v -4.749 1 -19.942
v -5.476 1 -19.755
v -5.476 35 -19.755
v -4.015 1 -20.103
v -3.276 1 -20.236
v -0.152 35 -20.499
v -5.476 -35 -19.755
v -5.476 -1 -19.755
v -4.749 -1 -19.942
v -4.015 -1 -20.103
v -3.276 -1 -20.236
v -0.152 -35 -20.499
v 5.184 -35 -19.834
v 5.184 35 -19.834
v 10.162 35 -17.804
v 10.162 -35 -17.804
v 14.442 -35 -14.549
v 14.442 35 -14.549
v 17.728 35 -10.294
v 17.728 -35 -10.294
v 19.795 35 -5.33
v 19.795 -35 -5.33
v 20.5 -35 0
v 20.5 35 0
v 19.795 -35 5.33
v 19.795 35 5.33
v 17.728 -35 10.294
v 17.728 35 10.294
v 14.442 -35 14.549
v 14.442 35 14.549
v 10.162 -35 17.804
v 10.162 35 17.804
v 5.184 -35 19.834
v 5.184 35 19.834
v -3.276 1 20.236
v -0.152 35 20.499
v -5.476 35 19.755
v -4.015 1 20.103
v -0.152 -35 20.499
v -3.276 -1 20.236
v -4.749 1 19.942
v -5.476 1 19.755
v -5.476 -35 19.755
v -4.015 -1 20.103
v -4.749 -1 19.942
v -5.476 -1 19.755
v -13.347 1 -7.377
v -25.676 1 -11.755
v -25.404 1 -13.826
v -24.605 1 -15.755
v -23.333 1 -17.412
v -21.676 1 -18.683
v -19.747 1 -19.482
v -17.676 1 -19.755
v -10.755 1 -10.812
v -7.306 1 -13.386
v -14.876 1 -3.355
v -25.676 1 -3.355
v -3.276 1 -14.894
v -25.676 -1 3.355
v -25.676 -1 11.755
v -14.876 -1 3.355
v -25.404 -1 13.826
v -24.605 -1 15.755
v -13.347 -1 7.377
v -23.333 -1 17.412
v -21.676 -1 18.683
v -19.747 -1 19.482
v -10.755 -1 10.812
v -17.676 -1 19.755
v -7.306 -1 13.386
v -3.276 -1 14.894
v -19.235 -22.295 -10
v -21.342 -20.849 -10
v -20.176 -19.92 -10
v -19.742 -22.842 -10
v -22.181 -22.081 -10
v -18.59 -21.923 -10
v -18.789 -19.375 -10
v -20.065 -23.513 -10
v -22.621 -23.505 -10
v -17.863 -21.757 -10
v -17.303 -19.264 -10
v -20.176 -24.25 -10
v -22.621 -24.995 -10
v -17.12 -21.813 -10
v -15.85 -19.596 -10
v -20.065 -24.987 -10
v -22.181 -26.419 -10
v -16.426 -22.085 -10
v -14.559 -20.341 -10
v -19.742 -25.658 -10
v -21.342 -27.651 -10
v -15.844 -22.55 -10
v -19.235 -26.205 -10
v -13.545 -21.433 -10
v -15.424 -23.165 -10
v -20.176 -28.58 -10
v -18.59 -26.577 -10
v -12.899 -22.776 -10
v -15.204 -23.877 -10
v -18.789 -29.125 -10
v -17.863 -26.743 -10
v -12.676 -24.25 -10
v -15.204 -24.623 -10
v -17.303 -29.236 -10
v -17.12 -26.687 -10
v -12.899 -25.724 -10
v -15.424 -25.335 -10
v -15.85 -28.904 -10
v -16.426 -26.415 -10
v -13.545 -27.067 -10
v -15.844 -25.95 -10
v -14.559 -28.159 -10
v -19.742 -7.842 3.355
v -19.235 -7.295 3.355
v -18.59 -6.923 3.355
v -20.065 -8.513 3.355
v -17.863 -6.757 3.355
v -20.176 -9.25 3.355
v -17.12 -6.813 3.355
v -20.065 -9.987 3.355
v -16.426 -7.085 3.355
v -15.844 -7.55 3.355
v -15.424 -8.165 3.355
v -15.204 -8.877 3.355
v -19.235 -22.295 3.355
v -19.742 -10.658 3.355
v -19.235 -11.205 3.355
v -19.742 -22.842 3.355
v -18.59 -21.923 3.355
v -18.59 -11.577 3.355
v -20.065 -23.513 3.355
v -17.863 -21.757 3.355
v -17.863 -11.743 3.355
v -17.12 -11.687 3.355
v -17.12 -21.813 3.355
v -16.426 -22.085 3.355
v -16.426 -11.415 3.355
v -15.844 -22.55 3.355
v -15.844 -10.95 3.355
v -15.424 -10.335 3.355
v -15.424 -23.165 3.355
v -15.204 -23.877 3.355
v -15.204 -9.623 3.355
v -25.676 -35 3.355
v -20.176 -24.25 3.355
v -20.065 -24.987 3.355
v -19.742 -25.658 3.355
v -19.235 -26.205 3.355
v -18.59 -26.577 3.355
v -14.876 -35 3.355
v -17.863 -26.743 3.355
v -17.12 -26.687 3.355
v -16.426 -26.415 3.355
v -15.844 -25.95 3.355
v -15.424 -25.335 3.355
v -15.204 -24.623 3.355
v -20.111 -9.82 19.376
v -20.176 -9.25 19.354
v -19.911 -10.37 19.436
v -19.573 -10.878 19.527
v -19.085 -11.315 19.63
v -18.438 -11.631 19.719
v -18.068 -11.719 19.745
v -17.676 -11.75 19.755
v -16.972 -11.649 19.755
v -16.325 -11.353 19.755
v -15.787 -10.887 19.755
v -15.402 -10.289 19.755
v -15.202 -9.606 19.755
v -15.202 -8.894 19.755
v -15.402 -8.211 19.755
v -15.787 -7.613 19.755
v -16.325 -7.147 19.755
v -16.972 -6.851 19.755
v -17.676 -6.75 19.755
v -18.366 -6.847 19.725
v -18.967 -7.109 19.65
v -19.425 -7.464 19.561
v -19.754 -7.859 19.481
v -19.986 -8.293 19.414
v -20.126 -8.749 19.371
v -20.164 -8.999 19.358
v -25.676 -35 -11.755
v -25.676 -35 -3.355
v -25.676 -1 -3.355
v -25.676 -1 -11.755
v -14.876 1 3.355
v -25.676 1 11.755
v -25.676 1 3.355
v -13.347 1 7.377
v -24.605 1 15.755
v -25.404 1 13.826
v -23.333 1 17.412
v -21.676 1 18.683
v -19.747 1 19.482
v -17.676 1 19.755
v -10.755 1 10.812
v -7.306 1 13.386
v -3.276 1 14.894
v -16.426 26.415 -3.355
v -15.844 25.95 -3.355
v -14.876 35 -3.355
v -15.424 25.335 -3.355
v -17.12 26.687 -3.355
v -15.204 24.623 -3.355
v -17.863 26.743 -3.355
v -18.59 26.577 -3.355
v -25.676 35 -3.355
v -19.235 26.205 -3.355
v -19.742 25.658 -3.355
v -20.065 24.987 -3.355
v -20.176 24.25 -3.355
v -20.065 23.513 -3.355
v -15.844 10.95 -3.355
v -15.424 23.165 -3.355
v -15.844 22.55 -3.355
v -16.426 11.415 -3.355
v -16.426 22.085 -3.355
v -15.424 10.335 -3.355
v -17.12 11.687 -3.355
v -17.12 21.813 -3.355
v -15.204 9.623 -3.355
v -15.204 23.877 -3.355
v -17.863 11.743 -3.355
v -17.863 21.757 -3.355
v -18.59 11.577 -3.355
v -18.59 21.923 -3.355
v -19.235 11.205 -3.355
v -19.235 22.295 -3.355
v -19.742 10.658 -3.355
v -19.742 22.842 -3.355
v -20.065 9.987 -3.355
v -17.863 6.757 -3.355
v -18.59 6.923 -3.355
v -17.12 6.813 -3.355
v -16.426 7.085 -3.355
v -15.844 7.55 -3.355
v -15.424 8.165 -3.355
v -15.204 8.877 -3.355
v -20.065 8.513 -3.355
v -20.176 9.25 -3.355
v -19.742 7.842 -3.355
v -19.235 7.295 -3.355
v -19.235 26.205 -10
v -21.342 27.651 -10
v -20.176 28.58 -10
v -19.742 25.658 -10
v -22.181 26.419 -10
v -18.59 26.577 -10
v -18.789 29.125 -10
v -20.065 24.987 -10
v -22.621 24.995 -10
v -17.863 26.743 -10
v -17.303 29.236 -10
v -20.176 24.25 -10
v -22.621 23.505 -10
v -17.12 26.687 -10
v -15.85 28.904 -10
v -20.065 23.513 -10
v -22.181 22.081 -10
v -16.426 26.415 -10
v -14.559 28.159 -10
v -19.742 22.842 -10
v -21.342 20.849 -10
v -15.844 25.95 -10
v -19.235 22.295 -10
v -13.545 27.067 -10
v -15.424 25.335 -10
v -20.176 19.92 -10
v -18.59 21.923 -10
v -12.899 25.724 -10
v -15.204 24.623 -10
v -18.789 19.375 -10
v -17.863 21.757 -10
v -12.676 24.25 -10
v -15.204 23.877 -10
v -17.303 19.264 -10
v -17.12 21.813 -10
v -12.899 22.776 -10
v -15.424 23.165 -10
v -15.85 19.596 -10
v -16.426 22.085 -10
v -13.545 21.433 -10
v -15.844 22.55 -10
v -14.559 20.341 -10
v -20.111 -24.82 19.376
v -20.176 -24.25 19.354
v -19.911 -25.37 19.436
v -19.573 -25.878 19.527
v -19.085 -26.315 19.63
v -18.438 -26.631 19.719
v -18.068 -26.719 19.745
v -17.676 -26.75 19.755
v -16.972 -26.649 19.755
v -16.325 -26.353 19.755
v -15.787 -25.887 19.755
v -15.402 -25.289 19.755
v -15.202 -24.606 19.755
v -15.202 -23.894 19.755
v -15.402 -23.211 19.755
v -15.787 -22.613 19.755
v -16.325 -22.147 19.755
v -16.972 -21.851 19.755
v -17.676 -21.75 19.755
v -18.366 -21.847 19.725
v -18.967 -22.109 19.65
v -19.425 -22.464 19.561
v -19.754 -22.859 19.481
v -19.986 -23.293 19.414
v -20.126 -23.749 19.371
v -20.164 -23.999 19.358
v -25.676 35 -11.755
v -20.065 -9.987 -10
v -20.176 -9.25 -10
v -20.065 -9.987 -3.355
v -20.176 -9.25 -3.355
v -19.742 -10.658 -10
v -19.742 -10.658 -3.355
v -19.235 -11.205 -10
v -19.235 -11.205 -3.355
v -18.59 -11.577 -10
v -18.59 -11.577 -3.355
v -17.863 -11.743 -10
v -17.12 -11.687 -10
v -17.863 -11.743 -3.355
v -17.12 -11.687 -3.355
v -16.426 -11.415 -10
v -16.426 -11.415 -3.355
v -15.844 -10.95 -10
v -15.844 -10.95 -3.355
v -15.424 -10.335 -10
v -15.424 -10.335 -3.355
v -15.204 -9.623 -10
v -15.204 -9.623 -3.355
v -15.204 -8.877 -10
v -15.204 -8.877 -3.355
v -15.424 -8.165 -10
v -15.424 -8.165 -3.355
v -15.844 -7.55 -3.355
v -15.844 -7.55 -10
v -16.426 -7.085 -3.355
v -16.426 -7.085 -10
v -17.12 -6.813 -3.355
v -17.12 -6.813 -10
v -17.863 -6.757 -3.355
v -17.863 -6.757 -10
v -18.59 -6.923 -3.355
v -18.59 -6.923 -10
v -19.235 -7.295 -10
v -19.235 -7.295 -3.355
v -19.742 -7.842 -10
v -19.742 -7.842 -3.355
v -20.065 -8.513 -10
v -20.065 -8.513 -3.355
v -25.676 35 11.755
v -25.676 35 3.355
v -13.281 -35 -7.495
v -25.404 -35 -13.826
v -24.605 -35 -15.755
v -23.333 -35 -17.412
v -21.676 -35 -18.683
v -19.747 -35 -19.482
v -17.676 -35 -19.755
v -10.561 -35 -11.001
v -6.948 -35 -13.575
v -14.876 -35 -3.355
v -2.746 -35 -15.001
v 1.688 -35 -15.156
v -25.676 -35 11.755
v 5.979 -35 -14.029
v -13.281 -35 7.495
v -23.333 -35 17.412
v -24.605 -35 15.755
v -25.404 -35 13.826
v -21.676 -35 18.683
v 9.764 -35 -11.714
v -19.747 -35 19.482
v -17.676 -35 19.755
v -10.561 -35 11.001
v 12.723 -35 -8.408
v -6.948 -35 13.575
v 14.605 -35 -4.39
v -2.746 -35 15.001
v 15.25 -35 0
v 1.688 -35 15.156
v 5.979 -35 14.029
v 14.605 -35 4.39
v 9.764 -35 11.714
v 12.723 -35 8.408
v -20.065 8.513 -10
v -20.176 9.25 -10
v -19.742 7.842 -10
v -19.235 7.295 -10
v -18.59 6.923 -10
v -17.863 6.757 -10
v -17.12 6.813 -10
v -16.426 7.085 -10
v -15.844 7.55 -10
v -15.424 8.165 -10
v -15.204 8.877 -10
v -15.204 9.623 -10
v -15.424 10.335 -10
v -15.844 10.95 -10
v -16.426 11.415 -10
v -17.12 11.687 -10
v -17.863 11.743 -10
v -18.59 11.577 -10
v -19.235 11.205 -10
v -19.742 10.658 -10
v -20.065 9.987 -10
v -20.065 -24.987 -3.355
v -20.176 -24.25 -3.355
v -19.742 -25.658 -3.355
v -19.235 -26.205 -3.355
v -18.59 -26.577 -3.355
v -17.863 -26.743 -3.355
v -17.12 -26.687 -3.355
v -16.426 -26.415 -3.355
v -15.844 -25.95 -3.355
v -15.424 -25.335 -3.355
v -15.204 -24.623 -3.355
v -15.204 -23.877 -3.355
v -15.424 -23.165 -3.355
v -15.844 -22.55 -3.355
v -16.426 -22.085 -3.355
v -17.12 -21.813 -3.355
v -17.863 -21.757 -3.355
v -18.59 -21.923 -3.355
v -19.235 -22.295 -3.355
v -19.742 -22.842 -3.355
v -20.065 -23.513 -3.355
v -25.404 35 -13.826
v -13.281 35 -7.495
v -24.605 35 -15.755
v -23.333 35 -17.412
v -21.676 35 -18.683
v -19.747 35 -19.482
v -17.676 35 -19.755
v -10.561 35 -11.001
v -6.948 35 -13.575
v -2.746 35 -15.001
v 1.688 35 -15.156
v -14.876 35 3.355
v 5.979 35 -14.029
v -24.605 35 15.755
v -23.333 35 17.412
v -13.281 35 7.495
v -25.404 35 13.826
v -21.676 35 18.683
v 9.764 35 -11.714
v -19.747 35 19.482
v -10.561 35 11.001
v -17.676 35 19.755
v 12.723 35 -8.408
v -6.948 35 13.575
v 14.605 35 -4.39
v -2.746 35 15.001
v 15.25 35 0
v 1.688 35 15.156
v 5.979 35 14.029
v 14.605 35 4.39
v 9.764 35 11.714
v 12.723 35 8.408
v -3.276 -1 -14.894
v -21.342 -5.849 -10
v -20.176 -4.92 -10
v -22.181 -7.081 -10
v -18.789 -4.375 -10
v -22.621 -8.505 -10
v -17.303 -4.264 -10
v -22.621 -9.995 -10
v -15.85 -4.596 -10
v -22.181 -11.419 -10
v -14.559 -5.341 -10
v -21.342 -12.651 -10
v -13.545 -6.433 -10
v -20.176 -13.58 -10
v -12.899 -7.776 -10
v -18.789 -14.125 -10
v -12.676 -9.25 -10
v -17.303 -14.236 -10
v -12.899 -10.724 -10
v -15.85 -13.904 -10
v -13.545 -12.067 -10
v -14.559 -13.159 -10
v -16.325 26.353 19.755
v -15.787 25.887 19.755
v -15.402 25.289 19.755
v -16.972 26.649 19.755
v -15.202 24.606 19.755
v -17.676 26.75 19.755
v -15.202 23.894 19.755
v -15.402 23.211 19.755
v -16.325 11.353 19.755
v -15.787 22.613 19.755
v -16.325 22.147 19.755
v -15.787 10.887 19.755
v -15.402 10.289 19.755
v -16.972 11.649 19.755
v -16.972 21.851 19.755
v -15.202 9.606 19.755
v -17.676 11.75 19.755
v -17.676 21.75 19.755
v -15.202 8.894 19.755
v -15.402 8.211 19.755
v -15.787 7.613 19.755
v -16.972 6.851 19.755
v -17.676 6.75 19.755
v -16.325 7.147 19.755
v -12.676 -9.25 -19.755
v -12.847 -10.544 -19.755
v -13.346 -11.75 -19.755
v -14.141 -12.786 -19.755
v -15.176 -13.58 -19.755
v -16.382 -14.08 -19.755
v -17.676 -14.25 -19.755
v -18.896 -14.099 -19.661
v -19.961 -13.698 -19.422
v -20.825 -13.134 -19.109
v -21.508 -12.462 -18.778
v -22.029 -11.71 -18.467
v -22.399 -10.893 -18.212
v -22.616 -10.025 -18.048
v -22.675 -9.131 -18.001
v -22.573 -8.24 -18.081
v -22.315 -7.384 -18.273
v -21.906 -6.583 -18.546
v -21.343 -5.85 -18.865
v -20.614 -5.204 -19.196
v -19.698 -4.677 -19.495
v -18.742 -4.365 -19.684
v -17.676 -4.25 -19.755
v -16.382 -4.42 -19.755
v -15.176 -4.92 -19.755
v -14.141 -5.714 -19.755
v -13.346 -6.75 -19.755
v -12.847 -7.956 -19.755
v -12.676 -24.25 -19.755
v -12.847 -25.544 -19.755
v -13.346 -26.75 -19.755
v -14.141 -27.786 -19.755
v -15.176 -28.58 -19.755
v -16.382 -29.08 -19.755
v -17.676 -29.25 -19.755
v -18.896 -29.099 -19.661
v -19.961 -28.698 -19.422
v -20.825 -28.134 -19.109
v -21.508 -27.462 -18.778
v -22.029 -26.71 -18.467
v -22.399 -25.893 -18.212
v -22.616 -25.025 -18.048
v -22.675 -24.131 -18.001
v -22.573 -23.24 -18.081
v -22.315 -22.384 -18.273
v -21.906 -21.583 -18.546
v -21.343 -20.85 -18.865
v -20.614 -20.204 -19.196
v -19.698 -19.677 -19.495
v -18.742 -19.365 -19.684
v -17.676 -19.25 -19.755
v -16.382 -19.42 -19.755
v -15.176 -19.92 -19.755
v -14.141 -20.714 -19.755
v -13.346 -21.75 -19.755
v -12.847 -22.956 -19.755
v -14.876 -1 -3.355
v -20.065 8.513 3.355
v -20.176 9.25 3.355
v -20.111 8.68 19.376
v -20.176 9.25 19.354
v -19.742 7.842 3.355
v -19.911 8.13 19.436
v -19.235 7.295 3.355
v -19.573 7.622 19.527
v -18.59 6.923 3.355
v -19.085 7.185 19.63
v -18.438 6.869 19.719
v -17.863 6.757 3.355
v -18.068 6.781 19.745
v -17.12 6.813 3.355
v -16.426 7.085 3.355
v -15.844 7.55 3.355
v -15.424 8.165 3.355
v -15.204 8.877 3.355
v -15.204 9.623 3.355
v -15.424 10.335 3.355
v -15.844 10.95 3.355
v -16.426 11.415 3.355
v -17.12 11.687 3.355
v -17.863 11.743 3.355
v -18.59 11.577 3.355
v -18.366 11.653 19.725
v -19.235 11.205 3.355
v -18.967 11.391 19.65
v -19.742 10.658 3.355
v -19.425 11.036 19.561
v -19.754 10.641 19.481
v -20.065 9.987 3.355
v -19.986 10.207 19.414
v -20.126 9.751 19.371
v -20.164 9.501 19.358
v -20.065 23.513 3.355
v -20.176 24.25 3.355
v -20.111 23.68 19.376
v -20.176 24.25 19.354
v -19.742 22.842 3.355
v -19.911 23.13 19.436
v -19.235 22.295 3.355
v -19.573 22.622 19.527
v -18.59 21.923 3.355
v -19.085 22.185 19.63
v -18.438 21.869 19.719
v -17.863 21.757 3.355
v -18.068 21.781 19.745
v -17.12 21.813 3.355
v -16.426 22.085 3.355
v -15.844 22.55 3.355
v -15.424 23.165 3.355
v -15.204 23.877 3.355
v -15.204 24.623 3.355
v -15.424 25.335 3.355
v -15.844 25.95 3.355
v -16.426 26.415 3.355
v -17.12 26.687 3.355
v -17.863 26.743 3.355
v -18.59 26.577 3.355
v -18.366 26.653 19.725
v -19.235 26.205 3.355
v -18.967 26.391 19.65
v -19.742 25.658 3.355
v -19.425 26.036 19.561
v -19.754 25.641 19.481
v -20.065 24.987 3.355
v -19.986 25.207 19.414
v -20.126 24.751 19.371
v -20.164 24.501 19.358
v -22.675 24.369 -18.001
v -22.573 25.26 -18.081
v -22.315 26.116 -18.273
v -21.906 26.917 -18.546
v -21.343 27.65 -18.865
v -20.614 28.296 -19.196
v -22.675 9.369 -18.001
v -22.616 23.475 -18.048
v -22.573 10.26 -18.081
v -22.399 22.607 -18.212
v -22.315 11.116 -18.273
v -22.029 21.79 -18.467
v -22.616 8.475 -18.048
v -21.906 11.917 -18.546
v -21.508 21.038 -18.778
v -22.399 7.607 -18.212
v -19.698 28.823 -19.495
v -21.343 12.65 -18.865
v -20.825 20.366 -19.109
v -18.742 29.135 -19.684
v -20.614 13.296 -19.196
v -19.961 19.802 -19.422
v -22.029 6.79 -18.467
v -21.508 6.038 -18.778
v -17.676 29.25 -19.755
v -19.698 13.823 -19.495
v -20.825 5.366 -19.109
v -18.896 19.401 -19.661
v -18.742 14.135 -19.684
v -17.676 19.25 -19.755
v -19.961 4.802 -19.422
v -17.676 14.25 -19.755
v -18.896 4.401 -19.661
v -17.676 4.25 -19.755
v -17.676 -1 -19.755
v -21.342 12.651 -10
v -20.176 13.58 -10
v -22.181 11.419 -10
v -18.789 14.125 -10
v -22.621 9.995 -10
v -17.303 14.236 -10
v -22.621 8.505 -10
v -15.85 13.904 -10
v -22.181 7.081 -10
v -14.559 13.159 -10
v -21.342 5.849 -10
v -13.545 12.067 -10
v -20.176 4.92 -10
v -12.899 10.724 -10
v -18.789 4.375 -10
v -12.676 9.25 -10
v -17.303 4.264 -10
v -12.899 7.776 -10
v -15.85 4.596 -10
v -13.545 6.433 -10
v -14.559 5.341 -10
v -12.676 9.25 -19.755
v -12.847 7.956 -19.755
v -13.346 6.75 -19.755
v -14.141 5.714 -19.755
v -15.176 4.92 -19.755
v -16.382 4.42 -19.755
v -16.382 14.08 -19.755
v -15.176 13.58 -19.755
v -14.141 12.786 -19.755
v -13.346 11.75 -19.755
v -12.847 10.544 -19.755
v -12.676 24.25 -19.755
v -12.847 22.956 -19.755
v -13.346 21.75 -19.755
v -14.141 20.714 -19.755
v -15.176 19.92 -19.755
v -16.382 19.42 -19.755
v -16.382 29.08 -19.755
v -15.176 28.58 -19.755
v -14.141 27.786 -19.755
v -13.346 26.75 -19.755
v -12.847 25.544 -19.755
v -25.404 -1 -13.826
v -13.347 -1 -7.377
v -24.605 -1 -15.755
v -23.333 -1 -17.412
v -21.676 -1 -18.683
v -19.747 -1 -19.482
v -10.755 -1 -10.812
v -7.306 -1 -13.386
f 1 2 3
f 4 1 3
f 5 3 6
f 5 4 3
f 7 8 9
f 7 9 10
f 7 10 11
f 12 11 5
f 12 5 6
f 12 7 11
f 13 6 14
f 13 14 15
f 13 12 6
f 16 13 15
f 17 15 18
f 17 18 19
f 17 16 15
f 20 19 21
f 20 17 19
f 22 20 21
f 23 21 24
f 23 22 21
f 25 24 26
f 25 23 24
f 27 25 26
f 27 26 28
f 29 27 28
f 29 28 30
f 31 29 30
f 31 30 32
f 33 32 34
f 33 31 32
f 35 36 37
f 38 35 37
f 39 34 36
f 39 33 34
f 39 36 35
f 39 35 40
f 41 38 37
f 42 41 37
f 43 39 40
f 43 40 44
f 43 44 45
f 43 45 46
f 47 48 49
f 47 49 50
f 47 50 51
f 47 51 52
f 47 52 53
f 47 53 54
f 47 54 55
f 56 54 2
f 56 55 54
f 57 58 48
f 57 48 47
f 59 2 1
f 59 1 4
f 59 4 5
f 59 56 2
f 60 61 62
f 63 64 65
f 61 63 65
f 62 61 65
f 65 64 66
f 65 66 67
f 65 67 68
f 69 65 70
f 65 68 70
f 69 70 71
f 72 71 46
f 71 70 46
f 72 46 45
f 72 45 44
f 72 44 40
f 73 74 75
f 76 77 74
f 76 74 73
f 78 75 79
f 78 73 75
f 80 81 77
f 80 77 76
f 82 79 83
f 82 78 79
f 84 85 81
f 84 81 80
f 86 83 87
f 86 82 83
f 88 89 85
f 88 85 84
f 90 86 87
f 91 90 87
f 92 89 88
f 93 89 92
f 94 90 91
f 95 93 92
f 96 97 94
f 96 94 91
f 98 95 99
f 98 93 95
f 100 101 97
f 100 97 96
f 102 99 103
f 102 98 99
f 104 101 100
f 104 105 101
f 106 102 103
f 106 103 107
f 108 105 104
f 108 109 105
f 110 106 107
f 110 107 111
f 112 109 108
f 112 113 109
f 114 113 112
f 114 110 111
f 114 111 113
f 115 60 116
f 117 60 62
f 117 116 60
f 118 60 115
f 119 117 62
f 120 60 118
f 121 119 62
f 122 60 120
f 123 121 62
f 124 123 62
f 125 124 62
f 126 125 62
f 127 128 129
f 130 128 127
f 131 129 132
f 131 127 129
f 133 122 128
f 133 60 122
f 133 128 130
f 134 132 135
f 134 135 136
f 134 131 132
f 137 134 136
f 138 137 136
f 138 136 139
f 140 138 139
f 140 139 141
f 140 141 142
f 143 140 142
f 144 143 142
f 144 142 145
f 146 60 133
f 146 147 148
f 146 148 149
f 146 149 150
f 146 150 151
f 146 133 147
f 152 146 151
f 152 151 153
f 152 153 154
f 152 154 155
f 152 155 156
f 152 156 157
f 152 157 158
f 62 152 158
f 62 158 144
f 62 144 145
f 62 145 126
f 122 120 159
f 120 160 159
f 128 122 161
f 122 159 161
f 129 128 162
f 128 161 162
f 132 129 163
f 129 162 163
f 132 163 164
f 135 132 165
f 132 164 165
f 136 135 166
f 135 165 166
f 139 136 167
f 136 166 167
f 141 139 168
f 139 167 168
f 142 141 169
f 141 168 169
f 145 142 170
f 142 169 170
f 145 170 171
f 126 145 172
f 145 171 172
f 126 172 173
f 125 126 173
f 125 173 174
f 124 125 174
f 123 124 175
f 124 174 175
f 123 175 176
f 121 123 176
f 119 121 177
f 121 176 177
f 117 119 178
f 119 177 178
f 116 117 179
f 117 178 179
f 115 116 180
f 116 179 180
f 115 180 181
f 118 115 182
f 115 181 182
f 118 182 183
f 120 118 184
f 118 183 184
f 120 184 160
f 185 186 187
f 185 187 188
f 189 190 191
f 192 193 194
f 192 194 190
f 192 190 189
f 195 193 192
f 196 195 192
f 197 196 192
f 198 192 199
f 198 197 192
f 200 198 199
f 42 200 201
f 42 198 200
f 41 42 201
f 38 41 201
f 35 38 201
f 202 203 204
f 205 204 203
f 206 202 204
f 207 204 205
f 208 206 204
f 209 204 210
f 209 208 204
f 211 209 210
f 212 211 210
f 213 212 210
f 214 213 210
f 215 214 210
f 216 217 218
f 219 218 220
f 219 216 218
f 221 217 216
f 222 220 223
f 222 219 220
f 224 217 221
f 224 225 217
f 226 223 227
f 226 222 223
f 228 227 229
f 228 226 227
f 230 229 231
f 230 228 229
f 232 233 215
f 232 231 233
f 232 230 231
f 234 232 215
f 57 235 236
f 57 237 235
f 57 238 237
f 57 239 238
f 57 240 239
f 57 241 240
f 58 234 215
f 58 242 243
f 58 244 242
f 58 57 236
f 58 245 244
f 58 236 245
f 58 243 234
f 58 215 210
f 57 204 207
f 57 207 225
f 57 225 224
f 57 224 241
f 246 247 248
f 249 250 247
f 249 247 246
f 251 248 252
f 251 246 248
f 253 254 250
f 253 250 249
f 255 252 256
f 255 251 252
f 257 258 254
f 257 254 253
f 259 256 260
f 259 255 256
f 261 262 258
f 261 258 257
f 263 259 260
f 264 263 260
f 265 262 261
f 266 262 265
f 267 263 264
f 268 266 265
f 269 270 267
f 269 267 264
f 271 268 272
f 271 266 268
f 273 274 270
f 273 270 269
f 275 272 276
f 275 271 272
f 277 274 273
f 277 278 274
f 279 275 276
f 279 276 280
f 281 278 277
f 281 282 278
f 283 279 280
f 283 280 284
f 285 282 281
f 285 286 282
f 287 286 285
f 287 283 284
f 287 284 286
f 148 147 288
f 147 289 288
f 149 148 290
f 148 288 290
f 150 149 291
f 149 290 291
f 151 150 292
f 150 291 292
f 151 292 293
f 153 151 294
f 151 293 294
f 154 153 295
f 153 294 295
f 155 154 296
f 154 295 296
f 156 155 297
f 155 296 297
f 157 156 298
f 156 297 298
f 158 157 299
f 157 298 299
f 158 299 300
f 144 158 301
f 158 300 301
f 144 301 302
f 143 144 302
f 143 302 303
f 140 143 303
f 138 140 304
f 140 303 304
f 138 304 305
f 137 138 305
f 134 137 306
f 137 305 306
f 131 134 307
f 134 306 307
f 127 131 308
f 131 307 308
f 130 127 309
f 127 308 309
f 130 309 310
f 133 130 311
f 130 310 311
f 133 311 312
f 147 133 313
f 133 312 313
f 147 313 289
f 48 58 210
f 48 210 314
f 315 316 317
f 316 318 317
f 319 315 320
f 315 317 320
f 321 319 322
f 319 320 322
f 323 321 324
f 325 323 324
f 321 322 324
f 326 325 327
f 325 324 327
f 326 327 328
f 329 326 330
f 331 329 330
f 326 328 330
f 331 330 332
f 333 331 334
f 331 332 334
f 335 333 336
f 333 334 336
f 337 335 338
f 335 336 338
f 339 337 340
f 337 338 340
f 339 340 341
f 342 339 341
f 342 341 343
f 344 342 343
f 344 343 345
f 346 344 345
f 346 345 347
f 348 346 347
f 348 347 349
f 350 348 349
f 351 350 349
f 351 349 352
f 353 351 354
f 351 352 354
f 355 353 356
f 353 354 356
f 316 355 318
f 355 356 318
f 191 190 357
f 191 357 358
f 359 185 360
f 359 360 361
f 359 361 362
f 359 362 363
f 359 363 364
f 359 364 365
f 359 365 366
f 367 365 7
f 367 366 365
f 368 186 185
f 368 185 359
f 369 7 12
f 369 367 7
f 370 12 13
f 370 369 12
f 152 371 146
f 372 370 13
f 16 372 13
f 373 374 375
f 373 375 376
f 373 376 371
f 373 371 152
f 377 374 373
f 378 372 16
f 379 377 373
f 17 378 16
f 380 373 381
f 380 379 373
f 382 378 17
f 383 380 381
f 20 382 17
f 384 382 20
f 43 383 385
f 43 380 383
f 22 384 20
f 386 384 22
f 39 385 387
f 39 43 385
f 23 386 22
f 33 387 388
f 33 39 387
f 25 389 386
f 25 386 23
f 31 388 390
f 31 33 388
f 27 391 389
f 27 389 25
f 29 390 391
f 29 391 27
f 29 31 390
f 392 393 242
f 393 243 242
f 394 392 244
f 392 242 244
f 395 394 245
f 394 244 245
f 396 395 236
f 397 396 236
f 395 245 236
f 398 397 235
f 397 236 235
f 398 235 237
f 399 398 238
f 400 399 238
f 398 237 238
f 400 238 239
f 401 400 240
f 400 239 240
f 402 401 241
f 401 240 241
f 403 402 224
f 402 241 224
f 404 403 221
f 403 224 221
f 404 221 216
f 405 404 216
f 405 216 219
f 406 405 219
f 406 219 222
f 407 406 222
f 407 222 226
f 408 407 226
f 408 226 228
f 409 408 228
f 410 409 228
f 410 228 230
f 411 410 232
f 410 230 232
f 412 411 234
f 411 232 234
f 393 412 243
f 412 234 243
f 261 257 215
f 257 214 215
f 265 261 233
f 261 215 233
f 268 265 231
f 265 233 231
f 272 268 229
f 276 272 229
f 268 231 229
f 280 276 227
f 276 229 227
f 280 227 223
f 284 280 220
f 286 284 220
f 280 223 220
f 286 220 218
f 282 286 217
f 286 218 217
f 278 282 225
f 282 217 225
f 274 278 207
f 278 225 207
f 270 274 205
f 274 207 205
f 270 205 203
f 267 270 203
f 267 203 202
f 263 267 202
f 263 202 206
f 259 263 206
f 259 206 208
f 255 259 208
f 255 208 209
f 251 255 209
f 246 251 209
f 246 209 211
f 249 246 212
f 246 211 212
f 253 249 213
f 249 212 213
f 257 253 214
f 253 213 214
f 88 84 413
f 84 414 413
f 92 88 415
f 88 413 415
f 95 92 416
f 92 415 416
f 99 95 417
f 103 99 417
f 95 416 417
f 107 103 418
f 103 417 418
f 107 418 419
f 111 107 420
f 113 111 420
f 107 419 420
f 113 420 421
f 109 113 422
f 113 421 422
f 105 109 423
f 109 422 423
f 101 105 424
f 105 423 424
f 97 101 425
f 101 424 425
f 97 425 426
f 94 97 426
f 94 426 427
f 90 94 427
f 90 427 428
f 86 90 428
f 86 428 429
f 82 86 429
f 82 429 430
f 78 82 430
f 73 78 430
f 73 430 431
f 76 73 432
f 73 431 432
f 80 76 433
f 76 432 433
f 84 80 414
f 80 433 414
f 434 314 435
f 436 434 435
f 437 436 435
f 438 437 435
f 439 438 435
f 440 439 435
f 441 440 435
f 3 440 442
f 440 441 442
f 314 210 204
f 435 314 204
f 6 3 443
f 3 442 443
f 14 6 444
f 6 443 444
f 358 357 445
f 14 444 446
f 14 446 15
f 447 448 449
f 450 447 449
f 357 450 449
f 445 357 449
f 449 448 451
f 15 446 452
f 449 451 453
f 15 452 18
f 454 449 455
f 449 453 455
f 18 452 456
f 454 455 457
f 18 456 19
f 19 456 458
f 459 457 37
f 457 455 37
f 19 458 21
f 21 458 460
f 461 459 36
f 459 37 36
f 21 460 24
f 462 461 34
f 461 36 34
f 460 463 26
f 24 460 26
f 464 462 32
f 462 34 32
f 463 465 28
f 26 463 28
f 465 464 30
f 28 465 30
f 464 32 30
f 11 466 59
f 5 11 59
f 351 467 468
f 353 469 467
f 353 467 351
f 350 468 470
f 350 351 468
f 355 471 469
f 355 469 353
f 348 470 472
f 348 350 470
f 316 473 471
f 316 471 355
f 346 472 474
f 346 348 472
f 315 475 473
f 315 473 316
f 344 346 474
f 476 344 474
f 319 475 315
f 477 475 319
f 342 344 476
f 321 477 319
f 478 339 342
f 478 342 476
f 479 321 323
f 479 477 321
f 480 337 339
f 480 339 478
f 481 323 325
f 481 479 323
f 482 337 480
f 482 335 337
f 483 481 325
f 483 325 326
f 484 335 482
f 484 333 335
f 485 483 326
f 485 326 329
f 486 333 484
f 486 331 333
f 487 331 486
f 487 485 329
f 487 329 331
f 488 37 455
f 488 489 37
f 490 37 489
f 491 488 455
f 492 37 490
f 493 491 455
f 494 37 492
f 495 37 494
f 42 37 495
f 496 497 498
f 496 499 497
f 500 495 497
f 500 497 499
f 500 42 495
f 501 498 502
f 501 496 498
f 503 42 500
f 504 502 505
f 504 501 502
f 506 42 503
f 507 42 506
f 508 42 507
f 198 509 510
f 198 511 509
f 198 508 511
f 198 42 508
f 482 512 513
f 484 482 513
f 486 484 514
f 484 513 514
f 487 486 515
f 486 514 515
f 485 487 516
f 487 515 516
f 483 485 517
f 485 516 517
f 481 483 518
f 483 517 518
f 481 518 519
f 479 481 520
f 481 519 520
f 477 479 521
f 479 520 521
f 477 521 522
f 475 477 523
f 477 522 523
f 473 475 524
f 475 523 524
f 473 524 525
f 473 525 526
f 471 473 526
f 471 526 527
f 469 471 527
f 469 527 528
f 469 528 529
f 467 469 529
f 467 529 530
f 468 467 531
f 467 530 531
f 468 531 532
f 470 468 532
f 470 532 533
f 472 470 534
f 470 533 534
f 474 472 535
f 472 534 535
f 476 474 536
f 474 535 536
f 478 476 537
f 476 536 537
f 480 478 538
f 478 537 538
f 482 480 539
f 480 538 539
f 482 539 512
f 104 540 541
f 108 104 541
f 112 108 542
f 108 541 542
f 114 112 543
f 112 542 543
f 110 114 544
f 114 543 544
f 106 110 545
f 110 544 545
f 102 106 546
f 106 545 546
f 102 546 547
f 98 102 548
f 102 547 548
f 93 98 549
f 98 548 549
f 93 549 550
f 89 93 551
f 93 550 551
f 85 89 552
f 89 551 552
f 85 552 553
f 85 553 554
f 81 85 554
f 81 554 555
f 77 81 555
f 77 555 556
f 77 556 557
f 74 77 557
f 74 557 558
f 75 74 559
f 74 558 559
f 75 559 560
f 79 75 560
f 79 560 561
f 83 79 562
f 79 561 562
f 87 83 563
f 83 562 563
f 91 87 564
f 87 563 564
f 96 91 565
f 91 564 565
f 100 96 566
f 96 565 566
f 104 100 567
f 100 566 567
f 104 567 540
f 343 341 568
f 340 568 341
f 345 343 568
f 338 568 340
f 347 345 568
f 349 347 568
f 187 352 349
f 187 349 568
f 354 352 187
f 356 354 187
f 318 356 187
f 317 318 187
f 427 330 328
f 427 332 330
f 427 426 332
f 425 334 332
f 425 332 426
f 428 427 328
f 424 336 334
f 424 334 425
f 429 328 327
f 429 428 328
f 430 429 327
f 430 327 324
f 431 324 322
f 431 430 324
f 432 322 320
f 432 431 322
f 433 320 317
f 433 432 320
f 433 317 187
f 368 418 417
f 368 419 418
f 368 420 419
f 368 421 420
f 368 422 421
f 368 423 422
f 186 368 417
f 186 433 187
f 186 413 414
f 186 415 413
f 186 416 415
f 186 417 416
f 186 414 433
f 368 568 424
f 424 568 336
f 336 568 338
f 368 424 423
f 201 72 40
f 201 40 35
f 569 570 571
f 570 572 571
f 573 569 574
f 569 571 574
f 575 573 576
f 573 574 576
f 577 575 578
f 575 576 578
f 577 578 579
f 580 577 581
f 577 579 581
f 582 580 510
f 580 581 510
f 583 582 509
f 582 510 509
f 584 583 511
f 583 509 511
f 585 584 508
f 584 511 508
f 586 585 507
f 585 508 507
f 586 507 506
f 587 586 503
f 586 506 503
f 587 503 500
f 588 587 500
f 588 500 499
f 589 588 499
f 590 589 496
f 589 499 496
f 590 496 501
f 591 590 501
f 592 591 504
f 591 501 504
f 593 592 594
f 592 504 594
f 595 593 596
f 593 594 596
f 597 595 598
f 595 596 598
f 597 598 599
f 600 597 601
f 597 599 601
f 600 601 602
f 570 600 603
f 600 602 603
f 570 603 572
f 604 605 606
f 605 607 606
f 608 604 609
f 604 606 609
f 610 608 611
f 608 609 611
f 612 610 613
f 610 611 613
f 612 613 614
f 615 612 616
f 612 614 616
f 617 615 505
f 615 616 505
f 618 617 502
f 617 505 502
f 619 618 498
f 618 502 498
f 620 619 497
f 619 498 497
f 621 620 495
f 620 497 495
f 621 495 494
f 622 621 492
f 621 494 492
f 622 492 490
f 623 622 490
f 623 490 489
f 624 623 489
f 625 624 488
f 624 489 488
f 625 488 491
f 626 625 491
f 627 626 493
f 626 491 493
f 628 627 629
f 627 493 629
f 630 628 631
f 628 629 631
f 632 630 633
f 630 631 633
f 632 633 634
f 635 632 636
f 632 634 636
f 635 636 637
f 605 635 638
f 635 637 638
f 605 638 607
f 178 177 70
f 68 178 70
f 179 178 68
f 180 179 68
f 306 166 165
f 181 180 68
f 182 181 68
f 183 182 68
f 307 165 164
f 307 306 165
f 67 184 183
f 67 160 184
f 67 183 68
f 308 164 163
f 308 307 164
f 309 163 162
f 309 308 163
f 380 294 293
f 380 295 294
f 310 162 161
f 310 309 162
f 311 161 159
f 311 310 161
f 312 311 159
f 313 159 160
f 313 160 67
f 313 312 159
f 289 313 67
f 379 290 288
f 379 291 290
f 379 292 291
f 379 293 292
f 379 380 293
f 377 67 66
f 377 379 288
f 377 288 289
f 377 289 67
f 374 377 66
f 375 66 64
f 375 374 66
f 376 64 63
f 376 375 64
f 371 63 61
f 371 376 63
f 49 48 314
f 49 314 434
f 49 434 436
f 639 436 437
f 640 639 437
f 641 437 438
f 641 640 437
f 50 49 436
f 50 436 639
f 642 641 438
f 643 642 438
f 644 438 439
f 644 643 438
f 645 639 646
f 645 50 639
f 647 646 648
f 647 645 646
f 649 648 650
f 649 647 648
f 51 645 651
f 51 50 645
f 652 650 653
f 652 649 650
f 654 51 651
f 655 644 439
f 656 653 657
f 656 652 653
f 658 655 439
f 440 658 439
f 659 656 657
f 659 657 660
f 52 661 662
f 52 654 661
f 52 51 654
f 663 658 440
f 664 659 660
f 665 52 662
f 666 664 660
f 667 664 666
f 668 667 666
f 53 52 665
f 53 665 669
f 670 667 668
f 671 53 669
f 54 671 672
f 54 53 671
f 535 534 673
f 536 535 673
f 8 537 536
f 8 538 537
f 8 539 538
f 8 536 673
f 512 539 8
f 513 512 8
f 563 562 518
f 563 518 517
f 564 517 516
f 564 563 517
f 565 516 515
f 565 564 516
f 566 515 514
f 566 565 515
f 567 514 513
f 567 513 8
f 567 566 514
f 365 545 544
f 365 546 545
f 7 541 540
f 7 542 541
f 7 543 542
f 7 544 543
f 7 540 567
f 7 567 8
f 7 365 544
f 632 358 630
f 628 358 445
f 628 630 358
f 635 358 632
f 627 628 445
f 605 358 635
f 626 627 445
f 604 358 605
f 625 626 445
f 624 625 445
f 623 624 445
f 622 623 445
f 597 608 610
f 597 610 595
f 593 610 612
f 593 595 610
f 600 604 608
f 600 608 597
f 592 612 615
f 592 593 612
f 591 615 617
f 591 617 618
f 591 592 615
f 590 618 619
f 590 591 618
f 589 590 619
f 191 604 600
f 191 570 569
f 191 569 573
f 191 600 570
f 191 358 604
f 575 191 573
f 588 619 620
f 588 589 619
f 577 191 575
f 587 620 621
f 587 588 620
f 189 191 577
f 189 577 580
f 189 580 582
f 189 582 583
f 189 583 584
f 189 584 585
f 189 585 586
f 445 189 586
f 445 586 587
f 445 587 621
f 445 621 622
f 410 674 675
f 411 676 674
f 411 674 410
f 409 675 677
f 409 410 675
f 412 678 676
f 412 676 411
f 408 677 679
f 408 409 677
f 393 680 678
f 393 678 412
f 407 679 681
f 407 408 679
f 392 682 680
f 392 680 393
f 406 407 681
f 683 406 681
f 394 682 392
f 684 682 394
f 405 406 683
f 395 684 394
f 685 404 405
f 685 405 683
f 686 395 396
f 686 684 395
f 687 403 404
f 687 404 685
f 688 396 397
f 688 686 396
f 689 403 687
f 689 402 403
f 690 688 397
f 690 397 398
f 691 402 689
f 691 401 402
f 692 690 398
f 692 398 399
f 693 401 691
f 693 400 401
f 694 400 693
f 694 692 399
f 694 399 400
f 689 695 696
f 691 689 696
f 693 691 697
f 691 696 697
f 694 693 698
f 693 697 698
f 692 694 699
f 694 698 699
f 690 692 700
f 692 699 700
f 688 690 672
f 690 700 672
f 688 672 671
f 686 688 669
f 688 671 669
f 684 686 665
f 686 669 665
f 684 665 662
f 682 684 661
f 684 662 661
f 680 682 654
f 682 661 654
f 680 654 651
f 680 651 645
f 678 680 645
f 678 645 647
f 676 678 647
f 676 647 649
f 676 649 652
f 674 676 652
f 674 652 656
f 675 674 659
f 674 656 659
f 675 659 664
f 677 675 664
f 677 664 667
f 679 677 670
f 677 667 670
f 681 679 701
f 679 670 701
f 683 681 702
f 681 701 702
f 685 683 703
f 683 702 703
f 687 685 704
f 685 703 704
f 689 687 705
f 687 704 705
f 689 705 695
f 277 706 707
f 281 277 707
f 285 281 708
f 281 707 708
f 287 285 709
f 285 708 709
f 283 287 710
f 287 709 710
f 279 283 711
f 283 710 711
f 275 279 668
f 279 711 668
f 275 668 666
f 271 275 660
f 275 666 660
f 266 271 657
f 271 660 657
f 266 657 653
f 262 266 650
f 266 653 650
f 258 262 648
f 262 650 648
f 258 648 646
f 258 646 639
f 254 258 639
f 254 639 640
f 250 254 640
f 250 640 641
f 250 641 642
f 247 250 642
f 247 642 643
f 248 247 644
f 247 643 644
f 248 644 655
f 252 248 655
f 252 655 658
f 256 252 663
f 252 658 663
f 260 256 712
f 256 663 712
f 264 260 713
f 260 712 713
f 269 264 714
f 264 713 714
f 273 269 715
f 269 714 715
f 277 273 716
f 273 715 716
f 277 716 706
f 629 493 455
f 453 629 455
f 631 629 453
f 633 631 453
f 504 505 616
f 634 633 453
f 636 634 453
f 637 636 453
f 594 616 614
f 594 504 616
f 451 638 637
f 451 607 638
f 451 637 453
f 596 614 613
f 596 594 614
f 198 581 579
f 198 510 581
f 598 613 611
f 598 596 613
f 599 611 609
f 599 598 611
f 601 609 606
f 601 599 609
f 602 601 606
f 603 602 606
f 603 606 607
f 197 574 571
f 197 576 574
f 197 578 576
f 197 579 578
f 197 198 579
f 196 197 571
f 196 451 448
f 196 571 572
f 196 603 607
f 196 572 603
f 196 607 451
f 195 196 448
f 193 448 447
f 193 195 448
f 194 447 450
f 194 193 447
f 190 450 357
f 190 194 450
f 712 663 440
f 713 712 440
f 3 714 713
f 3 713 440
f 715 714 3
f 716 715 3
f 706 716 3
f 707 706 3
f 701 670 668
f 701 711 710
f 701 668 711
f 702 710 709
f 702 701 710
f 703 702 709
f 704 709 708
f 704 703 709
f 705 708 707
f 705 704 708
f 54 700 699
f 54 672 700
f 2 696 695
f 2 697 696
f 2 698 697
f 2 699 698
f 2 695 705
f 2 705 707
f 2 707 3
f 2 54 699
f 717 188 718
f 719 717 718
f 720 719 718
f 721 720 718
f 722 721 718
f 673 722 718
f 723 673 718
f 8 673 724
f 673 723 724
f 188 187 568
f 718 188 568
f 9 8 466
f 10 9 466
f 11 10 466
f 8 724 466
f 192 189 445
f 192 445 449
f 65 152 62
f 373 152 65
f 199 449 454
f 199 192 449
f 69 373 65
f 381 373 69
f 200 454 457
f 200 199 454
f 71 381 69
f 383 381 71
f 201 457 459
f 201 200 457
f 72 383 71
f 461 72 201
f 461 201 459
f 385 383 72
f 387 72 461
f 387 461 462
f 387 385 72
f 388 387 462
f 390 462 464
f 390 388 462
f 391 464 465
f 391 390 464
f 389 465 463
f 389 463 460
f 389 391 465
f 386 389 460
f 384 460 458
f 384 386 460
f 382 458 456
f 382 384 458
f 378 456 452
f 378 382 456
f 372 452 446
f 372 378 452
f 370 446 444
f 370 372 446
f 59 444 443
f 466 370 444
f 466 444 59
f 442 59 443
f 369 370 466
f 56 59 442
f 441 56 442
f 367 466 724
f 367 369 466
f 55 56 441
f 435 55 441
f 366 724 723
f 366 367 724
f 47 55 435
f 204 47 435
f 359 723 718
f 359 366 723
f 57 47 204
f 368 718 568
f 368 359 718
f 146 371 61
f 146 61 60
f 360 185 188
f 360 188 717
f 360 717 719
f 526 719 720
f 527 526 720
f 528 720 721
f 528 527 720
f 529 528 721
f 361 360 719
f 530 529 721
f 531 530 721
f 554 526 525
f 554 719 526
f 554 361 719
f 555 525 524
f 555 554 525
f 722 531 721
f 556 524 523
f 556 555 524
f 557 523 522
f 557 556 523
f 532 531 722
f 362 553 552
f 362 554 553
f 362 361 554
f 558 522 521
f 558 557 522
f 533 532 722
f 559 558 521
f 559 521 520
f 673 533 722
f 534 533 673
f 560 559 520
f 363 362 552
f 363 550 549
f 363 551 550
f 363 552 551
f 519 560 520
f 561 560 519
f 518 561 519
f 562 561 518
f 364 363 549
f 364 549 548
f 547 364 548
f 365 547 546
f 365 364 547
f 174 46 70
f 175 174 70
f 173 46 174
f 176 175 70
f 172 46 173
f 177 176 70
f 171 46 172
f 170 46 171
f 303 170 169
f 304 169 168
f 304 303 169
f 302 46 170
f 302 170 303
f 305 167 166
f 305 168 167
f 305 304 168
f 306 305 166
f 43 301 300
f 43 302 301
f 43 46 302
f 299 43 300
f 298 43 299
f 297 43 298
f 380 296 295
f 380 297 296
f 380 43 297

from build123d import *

# Parameters (mm, degrees)
F1_DEPTH       = 35
F3_D           = 5
F3_START       = 1.7550021
F3_CBORE_D     = 10
F3_CBORE_DEPTH = 8
F4_W           = 22.4
F4_H           = 2
F5_DEPTH       = 25


with BuildPart() as f1:
    # F0 (on Front) → F1 (new body, symmetric)
    with BuildSketch(Plane.XZ):
        with BuildLine():
            ThreePointArc((-14.8763772272, 3.3549814595), (15.25, 0), (-14.8763772272, -3.3549814595))
            Line((-14.8763772272, -3.3549814595), (-25.6763772272, -3.3549814595))
            Line((-25.6763772272, -3.3549814595), (-25.6763772272, -11.7549814595))
            ThreePointArc((-25.6763772272, -11.7549814595), (-23.3332314767, -17.411835709), (-17.6763772272, -19.7549814595))
            Line((-17.6763772272, -19.7549814595), (-5.4763772272, -19.7549814595))
            ThreePointArc((-5.4763772272, -19.7549814595), (20.5, 0), (-5.4763772272, 19.7549814595))
            Line((-5.4763772272, 19.7549814595), (-17.6763772272, 19.7549814595))
            ThreePointArc((-17.6763772272, 19.7549814595), (-23.3332314767, 17.411835709), (-25.6763772272, 11.7549814595))
            Line((-25.6763772272, 11.7549814595), (-25.6763772272, 3.3549814595))
            Line((-25.6763772272, 3.3549814595), (-14.8763772272, 3.3549814595))
        make_face()
    extrude(amount=F1_DEPTH, both=True)

    # F3 (through all)
    # its depths count from where the whole tool has entered the part; down to there all is cleared
    with Locations(Plane(origin=(0, 0, -19.7549814595), x_dir=(1, 0, 0), z_dir=(0, 0, -1)).offset(-F3_START)):
        with Locations((-17.6763772272, 24.25), (-17.6763772272, 9.25), (-17.6763772272, -9.25), (-17.6763772272, -24.25)):
            CounterBoreHole(F3_D / 2, F3_CBORE_D / 2, F3_CBORE_DEPTH)

    # F4 (on Top) → F5 (cut, symmetric)
    with BuildSketch(Plane.XY):
        with Locations((-14.4763772272, 0)):
            Rectangle(F4_W, F4_H)
    extrude(amount=F5_DEPTH, both=True, mode=Mode.SUBTRACT)


solid = f1.part
